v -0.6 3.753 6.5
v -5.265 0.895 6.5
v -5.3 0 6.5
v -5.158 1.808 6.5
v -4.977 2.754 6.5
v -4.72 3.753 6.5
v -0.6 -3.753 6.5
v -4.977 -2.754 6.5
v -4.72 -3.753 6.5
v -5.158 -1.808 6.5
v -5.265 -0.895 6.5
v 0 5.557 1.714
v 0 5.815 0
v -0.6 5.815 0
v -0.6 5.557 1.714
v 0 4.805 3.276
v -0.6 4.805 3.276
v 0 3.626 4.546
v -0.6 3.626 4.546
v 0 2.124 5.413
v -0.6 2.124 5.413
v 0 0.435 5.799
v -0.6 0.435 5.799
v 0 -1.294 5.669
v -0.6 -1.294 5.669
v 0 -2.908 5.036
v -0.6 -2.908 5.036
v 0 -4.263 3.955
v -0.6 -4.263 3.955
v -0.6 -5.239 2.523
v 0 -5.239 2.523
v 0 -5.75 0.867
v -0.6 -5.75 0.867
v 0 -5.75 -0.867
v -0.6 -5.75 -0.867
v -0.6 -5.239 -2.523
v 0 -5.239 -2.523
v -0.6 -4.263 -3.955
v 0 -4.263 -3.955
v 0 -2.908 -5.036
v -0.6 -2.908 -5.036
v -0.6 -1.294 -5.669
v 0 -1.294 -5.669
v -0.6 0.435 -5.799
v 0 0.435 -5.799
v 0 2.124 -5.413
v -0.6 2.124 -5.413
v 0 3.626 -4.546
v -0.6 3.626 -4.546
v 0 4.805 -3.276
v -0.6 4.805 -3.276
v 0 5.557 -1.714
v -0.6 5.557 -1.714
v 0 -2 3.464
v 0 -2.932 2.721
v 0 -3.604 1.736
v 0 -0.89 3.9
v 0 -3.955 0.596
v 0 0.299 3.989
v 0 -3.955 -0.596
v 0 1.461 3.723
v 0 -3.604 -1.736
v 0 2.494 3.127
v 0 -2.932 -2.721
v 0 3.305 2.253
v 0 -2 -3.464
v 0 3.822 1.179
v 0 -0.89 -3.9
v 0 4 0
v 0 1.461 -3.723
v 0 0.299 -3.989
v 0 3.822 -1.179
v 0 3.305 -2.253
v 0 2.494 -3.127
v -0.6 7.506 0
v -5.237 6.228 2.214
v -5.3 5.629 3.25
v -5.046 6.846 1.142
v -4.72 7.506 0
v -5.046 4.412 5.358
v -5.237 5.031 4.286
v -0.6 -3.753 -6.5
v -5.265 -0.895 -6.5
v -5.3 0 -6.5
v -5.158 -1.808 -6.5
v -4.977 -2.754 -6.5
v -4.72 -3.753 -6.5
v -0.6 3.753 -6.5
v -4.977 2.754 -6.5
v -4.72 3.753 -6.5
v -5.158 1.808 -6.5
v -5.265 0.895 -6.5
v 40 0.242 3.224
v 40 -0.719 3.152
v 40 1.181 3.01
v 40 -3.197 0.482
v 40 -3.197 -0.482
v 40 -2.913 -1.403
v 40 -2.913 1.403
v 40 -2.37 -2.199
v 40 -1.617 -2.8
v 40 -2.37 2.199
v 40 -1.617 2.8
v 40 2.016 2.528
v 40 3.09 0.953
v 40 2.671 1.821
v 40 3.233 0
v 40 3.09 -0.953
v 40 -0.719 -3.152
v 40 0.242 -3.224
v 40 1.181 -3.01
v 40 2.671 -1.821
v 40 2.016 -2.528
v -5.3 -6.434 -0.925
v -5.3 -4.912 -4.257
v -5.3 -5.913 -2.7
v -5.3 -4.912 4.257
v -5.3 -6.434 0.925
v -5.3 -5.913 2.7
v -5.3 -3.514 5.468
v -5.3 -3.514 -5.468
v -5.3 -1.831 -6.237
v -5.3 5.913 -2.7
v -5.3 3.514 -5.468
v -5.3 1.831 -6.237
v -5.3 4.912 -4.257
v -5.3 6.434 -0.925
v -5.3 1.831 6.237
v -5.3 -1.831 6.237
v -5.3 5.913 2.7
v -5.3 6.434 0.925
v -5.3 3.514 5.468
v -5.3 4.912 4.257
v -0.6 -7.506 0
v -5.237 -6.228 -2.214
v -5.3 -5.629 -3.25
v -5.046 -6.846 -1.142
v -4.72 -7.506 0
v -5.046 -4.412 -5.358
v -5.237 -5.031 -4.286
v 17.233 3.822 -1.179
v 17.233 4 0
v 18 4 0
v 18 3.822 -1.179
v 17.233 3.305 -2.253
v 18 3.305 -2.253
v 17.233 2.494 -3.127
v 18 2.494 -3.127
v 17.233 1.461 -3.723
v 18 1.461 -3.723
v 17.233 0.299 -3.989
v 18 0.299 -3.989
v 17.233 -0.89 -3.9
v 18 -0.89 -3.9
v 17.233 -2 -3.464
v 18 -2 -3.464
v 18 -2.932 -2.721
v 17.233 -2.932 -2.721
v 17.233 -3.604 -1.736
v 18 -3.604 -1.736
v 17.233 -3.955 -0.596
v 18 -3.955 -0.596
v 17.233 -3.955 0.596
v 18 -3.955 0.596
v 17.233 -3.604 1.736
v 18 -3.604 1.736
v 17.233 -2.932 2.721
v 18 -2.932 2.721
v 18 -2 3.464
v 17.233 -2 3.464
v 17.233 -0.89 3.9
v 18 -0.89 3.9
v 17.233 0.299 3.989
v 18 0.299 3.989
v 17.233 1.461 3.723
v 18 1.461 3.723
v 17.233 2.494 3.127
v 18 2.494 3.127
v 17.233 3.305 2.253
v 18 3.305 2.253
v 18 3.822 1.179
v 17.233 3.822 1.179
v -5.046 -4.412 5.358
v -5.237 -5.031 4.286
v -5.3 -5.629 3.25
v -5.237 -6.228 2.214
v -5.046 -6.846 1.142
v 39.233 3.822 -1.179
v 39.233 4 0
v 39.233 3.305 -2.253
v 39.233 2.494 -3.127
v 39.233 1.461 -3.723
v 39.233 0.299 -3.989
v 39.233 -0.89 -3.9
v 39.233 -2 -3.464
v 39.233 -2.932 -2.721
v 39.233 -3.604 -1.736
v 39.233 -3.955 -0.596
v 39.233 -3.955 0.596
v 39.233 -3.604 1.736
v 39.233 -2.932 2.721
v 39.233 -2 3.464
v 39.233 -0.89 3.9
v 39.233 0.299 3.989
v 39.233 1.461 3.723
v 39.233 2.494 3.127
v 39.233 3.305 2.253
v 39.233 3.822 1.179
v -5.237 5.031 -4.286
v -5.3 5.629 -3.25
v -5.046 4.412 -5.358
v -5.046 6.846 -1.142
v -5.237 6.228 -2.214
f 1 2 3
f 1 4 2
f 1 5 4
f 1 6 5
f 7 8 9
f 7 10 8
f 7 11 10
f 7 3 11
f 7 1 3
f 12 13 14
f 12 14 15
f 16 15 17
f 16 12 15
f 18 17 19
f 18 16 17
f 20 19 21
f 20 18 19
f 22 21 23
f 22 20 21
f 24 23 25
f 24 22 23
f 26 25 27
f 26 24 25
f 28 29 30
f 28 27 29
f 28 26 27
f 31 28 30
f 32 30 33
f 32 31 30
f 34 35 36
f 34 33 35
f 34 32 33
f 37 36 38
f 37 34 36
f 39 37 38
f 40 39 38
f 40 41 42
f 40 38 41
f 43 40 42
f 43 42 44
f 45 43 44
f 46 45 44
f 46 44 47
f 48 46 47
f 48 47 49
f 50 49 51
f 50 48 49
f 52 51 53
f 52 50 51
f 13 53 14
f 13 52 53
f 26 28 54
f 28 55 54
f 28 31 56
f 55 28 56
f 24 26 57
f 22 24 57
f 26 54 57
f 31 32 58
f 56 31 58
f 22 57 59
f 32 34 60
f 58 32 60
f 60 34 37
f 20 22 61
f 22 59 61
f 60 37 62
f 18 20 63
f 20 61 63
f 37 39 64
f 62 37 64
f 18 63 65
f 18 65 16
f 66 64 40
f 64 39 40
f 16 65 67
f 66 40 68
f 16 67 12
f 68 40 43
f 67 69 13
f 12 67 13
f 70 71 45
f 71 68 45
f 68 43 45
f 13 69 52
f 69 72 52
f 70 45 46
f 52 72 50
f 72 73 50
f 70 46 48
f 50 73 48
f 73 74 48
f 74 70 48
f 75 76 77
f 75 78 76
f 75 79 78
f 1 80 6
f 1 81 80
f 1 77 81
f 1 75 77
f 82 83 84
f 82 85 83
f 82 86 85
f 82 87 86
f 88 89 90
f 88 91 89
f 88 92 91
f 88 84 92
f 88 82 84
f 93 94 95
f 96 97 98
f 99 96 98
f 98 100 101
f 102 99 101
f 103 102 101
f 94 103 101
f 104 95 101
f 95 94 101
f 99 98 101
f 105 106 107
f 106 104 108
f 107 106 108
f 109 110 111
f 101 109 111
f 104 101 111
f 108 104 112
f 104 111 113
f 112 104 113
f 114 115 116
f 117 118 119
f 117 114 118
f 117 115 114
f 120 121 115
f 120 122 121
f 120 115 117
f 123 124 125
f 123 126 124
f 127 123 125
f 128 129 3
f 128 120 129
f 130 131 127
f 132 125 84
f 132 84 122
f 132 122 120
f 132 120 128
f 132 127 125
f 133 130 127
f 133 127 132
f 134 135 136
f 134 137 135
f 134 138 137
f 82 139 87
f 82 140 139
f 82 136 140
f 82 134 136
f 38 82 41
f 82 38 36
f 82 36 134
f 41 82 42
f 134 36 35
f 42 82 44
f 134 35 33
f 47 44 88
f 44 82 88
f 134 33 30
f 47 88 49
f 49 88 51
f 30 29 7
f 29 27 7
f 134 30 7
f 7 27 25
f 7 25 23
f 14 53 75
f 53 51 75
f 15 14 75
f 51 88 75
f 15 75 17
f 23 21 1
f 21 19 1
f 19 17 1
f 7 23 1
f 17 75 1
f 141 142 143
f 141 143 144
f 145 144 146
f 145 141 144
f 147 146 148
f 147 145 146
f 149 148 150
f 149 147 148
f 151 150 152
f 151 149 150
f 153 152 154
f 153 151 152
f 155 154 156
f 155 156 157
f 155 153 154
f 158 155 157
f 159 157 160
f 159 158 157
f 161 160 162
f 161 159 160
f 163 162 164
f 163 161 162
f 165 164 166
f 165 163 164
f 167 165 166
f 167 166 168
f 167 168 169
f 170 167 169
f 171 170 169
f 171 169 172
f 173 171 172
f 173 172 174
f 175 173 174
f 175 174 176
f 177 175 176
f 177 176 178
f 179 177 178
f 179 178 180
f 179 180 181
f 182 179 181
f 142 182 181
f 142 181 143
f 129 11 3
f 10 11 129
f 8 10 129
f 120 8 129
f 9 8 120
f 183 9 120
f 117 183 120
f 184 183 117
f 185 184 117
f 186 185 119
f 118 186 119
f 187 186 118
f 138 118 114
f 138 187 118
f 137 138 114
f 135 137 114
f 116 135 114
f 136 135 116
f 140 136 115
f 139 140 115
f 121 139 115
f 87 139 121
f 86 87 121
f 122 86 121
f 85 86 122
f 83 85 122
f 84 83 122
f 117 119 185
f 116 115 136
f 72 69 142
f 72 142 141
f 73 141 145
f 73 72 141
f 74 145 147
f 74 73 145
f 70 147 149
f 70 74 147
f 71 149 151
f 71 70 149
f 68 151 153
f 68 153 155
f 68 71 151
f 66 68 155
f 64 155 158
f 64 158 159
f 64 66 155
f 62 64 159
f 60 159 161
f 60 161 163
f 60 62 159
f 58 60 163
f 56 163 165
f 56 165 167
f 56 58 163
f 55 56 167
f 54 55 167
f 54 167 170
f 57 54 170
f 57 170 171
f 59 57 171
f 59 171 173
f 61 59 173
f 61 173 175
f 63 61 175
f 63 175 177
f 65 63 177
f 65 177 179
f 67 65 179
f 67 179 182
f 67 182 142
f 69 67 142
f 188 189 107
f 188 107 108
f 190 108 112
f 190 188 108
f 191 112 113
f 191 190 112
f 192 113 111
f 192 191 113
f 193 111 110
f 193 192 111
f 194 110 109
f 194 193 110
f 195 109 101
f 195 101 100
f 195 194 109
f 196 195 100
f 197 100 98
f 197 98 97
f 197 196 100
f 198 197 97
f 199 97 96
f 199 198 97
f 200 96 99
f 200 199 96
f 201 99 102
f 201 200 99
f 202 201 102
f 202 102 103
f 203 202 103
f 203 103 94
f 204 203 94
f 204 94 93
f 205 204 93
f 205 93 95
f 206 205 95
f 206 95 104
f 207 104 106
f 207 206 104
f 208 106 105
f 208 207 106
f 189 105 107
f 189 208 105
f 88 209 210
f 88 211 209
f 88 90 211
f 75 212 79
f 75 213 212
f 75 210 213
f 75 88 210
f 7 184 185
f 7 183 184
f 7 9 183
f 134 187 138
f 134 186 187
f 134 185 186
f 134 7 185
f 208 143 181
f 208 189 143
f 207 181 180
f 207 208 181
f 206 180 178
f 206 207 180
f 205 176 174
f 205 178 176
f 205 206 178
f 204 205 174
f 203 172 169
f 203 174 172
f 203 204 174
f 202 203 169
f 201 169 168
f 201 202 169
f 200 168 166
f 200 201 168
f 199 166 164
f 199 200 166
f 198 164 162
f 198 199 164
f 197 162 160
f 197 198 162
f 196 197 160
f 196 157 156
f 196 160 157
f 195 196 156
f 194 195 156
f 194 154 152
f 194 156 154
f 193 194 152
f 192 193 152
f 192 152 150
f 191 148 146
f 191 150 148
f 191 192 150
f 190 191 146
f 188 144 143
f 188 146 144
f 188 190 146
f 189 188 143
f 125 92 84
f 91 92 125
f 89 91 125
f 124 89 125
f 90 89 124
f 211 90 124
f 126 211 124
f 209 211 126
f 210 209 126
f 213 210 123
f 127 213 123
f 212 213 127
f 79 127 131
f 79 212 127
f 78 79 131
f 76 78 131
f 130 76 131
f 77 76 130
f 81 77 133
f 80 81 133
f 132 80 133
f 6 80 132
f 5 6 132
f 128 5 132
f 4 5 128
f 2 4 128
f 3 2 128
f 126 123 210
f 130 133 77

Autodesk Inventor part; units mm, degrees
ref_plane "YZ Plane" through (0, 0, 0) normal (1, 0, 0) x (0, 1, 0)
ref_plane "XZ Plane" through (0, 0, 0) normal (0, 1, 0) x (-1, 0, 0)
sketch "Sketch1" plane through (0, 0, 0) normal (0, 0, 1) x (1, 0, 0)
  line L0 (0, 5.815) -> (0, 4)
  line L1 (18, 4) -> (40, 4)
  line L2 (40, 4) -> (40, 0)
  line L3 (40, 0) -> (-0.6001, 0)
  line L4 (-8.7201, 0) -> (48.12, 0) projected
  line L5 (-0.6001, 0) -> (-0.6001, 5.815)
  line L6 (-0.6001, 5.815) -> (0, 5.815)
  line L7 (18, 4) -> (17.2331, 4)
  line L8 (17.2331, 4) -> (0, 4)
  line L9 (0, -1.163) -> (0, 6.978) projected
  dimension "d0" = 40
  dimension "d1" = 22
  dimension "d2" = 8
  dimension "d9" = 0.6001
  dimension "d10" = 11.63
  dimension "d13" = 0.7669
  dimension "d14" = 8
revolve "Body" add sketch "Sketch1" angle 360 about axis through (40, 0, 0) along (-1, 0, 0)
sketch "Sketch2" plane through (-0.6001, 0, 0) normal (-1, 0, 0) x (0, 0, 1)
  line L0 (0, 7.5056) -> (6.5, 3.7528)
  line L1 (6.5, 3.7528) -> (6.5, -3.7528)
  line L2 (6.5, -3.7528) -> (0, -7.5056)
  line L3 (0, -7.5056) -> (-6.5, -3.7528)
  line L4 (-6.5, -3.7528) -> (-6.5, 3.7528)
  line L5 (-6.5, 3.7528) -> (0, 7.5056)
  point P0 (0, 0)
  point P1 (0, 0)
  dimension "d11" = 13
extrude "Head" add sketch "Sketch2" along normal blind 4.7
sketch "Sketch4" plane through (0, 0, 0) normal (0, 0, 1) x (1, 0, 0)
  line L0 (-5.3001, 6.5) -> (-5.3001, 7.5056)
  line L1 (-5.3001, 7.5056) -> (-4.7195, 7.5056)
  line L2 (-4.7195, 7.5056) -> (-5.3001, 6.5)
  line L3 (-6.2401, 0) -> (0.3399, 0) projected
  line L4 (-0.6001, 7.5056) -> (-5.3001, 7.5056) projected
  line L5 (-5.3001, 3.7528) -> (-5.3001, 7.5056) projected
  dimension "d5" = 30
  dimension "d19" = 13
revolve "Chamfer1" cut sketch "Sketch4" angle 360 about axis through (-10, 0, 0) along (1, 0, 0)
thread "Thread" size "M8x1.25" class "6g" standard "ISO Metric profile" length 22
chamfer "Chamfer2" distance 0.7668 distance2 0.7669 1 edges at (40, -4, 0) measured on face at (40, 0.4453, 1.0204)
ref_plane "Work Plane1" through (1.525, 0, 0) normal (0, 0, 1) x (1, 0, 0)
equation "\"d0\" = NLG"
equation "\"d1\" = GEL"
equation "\"d2\" = GD"
equation "\"d10\" = SD2"
equation "\"d14\" = BDM"
equation "\"d11\" = SW"
equation "\"d3\" = KOH - SD"
equation "\"d5\" = ANG1"
equation "\"d19\" = SW0"
equation "\"d15\" = GEL"
equation "\"d6\" = -0.5 * SPD + 0.5 * GD"
equation "\"NLG\" = 40"
equation "\"GD\" = NND"
equation "\"BDM\" = NND"
equation "\"KOH\" = 5.3"
equation "\"GEL\" = 22"
equation "\"SW\" = 13"
equation "\"SW0\" = SW"
equation "\"SPD\" = NND - 1.2269 * PTC"
equation "\"SD2\" = 11.63"
equation "\"SD\" = 0.6"
equation "\"ANG1\" = 30deg"
equation "\"GAL\" = 0.61345 * PTC"
equation "\"GUL\" = 0.61345 * PTC"
equation "\"RR\" = 0.4"
equation "\"GD1\" = THREADDIA - 1.2269 * PTC"
equation "\"THREADDIA\" = 8"
equation "\"SDH\" = SD2"
equation "\"TOA\" = 30deg"
equation "\"PTC\" = 1.25"
equation "\"NND\" = 8"
equation "\"E0\" = 1.155 * SW"
properties part number "ISO 4014 - M8 x 40" material "Stainless Steel, 440C"
